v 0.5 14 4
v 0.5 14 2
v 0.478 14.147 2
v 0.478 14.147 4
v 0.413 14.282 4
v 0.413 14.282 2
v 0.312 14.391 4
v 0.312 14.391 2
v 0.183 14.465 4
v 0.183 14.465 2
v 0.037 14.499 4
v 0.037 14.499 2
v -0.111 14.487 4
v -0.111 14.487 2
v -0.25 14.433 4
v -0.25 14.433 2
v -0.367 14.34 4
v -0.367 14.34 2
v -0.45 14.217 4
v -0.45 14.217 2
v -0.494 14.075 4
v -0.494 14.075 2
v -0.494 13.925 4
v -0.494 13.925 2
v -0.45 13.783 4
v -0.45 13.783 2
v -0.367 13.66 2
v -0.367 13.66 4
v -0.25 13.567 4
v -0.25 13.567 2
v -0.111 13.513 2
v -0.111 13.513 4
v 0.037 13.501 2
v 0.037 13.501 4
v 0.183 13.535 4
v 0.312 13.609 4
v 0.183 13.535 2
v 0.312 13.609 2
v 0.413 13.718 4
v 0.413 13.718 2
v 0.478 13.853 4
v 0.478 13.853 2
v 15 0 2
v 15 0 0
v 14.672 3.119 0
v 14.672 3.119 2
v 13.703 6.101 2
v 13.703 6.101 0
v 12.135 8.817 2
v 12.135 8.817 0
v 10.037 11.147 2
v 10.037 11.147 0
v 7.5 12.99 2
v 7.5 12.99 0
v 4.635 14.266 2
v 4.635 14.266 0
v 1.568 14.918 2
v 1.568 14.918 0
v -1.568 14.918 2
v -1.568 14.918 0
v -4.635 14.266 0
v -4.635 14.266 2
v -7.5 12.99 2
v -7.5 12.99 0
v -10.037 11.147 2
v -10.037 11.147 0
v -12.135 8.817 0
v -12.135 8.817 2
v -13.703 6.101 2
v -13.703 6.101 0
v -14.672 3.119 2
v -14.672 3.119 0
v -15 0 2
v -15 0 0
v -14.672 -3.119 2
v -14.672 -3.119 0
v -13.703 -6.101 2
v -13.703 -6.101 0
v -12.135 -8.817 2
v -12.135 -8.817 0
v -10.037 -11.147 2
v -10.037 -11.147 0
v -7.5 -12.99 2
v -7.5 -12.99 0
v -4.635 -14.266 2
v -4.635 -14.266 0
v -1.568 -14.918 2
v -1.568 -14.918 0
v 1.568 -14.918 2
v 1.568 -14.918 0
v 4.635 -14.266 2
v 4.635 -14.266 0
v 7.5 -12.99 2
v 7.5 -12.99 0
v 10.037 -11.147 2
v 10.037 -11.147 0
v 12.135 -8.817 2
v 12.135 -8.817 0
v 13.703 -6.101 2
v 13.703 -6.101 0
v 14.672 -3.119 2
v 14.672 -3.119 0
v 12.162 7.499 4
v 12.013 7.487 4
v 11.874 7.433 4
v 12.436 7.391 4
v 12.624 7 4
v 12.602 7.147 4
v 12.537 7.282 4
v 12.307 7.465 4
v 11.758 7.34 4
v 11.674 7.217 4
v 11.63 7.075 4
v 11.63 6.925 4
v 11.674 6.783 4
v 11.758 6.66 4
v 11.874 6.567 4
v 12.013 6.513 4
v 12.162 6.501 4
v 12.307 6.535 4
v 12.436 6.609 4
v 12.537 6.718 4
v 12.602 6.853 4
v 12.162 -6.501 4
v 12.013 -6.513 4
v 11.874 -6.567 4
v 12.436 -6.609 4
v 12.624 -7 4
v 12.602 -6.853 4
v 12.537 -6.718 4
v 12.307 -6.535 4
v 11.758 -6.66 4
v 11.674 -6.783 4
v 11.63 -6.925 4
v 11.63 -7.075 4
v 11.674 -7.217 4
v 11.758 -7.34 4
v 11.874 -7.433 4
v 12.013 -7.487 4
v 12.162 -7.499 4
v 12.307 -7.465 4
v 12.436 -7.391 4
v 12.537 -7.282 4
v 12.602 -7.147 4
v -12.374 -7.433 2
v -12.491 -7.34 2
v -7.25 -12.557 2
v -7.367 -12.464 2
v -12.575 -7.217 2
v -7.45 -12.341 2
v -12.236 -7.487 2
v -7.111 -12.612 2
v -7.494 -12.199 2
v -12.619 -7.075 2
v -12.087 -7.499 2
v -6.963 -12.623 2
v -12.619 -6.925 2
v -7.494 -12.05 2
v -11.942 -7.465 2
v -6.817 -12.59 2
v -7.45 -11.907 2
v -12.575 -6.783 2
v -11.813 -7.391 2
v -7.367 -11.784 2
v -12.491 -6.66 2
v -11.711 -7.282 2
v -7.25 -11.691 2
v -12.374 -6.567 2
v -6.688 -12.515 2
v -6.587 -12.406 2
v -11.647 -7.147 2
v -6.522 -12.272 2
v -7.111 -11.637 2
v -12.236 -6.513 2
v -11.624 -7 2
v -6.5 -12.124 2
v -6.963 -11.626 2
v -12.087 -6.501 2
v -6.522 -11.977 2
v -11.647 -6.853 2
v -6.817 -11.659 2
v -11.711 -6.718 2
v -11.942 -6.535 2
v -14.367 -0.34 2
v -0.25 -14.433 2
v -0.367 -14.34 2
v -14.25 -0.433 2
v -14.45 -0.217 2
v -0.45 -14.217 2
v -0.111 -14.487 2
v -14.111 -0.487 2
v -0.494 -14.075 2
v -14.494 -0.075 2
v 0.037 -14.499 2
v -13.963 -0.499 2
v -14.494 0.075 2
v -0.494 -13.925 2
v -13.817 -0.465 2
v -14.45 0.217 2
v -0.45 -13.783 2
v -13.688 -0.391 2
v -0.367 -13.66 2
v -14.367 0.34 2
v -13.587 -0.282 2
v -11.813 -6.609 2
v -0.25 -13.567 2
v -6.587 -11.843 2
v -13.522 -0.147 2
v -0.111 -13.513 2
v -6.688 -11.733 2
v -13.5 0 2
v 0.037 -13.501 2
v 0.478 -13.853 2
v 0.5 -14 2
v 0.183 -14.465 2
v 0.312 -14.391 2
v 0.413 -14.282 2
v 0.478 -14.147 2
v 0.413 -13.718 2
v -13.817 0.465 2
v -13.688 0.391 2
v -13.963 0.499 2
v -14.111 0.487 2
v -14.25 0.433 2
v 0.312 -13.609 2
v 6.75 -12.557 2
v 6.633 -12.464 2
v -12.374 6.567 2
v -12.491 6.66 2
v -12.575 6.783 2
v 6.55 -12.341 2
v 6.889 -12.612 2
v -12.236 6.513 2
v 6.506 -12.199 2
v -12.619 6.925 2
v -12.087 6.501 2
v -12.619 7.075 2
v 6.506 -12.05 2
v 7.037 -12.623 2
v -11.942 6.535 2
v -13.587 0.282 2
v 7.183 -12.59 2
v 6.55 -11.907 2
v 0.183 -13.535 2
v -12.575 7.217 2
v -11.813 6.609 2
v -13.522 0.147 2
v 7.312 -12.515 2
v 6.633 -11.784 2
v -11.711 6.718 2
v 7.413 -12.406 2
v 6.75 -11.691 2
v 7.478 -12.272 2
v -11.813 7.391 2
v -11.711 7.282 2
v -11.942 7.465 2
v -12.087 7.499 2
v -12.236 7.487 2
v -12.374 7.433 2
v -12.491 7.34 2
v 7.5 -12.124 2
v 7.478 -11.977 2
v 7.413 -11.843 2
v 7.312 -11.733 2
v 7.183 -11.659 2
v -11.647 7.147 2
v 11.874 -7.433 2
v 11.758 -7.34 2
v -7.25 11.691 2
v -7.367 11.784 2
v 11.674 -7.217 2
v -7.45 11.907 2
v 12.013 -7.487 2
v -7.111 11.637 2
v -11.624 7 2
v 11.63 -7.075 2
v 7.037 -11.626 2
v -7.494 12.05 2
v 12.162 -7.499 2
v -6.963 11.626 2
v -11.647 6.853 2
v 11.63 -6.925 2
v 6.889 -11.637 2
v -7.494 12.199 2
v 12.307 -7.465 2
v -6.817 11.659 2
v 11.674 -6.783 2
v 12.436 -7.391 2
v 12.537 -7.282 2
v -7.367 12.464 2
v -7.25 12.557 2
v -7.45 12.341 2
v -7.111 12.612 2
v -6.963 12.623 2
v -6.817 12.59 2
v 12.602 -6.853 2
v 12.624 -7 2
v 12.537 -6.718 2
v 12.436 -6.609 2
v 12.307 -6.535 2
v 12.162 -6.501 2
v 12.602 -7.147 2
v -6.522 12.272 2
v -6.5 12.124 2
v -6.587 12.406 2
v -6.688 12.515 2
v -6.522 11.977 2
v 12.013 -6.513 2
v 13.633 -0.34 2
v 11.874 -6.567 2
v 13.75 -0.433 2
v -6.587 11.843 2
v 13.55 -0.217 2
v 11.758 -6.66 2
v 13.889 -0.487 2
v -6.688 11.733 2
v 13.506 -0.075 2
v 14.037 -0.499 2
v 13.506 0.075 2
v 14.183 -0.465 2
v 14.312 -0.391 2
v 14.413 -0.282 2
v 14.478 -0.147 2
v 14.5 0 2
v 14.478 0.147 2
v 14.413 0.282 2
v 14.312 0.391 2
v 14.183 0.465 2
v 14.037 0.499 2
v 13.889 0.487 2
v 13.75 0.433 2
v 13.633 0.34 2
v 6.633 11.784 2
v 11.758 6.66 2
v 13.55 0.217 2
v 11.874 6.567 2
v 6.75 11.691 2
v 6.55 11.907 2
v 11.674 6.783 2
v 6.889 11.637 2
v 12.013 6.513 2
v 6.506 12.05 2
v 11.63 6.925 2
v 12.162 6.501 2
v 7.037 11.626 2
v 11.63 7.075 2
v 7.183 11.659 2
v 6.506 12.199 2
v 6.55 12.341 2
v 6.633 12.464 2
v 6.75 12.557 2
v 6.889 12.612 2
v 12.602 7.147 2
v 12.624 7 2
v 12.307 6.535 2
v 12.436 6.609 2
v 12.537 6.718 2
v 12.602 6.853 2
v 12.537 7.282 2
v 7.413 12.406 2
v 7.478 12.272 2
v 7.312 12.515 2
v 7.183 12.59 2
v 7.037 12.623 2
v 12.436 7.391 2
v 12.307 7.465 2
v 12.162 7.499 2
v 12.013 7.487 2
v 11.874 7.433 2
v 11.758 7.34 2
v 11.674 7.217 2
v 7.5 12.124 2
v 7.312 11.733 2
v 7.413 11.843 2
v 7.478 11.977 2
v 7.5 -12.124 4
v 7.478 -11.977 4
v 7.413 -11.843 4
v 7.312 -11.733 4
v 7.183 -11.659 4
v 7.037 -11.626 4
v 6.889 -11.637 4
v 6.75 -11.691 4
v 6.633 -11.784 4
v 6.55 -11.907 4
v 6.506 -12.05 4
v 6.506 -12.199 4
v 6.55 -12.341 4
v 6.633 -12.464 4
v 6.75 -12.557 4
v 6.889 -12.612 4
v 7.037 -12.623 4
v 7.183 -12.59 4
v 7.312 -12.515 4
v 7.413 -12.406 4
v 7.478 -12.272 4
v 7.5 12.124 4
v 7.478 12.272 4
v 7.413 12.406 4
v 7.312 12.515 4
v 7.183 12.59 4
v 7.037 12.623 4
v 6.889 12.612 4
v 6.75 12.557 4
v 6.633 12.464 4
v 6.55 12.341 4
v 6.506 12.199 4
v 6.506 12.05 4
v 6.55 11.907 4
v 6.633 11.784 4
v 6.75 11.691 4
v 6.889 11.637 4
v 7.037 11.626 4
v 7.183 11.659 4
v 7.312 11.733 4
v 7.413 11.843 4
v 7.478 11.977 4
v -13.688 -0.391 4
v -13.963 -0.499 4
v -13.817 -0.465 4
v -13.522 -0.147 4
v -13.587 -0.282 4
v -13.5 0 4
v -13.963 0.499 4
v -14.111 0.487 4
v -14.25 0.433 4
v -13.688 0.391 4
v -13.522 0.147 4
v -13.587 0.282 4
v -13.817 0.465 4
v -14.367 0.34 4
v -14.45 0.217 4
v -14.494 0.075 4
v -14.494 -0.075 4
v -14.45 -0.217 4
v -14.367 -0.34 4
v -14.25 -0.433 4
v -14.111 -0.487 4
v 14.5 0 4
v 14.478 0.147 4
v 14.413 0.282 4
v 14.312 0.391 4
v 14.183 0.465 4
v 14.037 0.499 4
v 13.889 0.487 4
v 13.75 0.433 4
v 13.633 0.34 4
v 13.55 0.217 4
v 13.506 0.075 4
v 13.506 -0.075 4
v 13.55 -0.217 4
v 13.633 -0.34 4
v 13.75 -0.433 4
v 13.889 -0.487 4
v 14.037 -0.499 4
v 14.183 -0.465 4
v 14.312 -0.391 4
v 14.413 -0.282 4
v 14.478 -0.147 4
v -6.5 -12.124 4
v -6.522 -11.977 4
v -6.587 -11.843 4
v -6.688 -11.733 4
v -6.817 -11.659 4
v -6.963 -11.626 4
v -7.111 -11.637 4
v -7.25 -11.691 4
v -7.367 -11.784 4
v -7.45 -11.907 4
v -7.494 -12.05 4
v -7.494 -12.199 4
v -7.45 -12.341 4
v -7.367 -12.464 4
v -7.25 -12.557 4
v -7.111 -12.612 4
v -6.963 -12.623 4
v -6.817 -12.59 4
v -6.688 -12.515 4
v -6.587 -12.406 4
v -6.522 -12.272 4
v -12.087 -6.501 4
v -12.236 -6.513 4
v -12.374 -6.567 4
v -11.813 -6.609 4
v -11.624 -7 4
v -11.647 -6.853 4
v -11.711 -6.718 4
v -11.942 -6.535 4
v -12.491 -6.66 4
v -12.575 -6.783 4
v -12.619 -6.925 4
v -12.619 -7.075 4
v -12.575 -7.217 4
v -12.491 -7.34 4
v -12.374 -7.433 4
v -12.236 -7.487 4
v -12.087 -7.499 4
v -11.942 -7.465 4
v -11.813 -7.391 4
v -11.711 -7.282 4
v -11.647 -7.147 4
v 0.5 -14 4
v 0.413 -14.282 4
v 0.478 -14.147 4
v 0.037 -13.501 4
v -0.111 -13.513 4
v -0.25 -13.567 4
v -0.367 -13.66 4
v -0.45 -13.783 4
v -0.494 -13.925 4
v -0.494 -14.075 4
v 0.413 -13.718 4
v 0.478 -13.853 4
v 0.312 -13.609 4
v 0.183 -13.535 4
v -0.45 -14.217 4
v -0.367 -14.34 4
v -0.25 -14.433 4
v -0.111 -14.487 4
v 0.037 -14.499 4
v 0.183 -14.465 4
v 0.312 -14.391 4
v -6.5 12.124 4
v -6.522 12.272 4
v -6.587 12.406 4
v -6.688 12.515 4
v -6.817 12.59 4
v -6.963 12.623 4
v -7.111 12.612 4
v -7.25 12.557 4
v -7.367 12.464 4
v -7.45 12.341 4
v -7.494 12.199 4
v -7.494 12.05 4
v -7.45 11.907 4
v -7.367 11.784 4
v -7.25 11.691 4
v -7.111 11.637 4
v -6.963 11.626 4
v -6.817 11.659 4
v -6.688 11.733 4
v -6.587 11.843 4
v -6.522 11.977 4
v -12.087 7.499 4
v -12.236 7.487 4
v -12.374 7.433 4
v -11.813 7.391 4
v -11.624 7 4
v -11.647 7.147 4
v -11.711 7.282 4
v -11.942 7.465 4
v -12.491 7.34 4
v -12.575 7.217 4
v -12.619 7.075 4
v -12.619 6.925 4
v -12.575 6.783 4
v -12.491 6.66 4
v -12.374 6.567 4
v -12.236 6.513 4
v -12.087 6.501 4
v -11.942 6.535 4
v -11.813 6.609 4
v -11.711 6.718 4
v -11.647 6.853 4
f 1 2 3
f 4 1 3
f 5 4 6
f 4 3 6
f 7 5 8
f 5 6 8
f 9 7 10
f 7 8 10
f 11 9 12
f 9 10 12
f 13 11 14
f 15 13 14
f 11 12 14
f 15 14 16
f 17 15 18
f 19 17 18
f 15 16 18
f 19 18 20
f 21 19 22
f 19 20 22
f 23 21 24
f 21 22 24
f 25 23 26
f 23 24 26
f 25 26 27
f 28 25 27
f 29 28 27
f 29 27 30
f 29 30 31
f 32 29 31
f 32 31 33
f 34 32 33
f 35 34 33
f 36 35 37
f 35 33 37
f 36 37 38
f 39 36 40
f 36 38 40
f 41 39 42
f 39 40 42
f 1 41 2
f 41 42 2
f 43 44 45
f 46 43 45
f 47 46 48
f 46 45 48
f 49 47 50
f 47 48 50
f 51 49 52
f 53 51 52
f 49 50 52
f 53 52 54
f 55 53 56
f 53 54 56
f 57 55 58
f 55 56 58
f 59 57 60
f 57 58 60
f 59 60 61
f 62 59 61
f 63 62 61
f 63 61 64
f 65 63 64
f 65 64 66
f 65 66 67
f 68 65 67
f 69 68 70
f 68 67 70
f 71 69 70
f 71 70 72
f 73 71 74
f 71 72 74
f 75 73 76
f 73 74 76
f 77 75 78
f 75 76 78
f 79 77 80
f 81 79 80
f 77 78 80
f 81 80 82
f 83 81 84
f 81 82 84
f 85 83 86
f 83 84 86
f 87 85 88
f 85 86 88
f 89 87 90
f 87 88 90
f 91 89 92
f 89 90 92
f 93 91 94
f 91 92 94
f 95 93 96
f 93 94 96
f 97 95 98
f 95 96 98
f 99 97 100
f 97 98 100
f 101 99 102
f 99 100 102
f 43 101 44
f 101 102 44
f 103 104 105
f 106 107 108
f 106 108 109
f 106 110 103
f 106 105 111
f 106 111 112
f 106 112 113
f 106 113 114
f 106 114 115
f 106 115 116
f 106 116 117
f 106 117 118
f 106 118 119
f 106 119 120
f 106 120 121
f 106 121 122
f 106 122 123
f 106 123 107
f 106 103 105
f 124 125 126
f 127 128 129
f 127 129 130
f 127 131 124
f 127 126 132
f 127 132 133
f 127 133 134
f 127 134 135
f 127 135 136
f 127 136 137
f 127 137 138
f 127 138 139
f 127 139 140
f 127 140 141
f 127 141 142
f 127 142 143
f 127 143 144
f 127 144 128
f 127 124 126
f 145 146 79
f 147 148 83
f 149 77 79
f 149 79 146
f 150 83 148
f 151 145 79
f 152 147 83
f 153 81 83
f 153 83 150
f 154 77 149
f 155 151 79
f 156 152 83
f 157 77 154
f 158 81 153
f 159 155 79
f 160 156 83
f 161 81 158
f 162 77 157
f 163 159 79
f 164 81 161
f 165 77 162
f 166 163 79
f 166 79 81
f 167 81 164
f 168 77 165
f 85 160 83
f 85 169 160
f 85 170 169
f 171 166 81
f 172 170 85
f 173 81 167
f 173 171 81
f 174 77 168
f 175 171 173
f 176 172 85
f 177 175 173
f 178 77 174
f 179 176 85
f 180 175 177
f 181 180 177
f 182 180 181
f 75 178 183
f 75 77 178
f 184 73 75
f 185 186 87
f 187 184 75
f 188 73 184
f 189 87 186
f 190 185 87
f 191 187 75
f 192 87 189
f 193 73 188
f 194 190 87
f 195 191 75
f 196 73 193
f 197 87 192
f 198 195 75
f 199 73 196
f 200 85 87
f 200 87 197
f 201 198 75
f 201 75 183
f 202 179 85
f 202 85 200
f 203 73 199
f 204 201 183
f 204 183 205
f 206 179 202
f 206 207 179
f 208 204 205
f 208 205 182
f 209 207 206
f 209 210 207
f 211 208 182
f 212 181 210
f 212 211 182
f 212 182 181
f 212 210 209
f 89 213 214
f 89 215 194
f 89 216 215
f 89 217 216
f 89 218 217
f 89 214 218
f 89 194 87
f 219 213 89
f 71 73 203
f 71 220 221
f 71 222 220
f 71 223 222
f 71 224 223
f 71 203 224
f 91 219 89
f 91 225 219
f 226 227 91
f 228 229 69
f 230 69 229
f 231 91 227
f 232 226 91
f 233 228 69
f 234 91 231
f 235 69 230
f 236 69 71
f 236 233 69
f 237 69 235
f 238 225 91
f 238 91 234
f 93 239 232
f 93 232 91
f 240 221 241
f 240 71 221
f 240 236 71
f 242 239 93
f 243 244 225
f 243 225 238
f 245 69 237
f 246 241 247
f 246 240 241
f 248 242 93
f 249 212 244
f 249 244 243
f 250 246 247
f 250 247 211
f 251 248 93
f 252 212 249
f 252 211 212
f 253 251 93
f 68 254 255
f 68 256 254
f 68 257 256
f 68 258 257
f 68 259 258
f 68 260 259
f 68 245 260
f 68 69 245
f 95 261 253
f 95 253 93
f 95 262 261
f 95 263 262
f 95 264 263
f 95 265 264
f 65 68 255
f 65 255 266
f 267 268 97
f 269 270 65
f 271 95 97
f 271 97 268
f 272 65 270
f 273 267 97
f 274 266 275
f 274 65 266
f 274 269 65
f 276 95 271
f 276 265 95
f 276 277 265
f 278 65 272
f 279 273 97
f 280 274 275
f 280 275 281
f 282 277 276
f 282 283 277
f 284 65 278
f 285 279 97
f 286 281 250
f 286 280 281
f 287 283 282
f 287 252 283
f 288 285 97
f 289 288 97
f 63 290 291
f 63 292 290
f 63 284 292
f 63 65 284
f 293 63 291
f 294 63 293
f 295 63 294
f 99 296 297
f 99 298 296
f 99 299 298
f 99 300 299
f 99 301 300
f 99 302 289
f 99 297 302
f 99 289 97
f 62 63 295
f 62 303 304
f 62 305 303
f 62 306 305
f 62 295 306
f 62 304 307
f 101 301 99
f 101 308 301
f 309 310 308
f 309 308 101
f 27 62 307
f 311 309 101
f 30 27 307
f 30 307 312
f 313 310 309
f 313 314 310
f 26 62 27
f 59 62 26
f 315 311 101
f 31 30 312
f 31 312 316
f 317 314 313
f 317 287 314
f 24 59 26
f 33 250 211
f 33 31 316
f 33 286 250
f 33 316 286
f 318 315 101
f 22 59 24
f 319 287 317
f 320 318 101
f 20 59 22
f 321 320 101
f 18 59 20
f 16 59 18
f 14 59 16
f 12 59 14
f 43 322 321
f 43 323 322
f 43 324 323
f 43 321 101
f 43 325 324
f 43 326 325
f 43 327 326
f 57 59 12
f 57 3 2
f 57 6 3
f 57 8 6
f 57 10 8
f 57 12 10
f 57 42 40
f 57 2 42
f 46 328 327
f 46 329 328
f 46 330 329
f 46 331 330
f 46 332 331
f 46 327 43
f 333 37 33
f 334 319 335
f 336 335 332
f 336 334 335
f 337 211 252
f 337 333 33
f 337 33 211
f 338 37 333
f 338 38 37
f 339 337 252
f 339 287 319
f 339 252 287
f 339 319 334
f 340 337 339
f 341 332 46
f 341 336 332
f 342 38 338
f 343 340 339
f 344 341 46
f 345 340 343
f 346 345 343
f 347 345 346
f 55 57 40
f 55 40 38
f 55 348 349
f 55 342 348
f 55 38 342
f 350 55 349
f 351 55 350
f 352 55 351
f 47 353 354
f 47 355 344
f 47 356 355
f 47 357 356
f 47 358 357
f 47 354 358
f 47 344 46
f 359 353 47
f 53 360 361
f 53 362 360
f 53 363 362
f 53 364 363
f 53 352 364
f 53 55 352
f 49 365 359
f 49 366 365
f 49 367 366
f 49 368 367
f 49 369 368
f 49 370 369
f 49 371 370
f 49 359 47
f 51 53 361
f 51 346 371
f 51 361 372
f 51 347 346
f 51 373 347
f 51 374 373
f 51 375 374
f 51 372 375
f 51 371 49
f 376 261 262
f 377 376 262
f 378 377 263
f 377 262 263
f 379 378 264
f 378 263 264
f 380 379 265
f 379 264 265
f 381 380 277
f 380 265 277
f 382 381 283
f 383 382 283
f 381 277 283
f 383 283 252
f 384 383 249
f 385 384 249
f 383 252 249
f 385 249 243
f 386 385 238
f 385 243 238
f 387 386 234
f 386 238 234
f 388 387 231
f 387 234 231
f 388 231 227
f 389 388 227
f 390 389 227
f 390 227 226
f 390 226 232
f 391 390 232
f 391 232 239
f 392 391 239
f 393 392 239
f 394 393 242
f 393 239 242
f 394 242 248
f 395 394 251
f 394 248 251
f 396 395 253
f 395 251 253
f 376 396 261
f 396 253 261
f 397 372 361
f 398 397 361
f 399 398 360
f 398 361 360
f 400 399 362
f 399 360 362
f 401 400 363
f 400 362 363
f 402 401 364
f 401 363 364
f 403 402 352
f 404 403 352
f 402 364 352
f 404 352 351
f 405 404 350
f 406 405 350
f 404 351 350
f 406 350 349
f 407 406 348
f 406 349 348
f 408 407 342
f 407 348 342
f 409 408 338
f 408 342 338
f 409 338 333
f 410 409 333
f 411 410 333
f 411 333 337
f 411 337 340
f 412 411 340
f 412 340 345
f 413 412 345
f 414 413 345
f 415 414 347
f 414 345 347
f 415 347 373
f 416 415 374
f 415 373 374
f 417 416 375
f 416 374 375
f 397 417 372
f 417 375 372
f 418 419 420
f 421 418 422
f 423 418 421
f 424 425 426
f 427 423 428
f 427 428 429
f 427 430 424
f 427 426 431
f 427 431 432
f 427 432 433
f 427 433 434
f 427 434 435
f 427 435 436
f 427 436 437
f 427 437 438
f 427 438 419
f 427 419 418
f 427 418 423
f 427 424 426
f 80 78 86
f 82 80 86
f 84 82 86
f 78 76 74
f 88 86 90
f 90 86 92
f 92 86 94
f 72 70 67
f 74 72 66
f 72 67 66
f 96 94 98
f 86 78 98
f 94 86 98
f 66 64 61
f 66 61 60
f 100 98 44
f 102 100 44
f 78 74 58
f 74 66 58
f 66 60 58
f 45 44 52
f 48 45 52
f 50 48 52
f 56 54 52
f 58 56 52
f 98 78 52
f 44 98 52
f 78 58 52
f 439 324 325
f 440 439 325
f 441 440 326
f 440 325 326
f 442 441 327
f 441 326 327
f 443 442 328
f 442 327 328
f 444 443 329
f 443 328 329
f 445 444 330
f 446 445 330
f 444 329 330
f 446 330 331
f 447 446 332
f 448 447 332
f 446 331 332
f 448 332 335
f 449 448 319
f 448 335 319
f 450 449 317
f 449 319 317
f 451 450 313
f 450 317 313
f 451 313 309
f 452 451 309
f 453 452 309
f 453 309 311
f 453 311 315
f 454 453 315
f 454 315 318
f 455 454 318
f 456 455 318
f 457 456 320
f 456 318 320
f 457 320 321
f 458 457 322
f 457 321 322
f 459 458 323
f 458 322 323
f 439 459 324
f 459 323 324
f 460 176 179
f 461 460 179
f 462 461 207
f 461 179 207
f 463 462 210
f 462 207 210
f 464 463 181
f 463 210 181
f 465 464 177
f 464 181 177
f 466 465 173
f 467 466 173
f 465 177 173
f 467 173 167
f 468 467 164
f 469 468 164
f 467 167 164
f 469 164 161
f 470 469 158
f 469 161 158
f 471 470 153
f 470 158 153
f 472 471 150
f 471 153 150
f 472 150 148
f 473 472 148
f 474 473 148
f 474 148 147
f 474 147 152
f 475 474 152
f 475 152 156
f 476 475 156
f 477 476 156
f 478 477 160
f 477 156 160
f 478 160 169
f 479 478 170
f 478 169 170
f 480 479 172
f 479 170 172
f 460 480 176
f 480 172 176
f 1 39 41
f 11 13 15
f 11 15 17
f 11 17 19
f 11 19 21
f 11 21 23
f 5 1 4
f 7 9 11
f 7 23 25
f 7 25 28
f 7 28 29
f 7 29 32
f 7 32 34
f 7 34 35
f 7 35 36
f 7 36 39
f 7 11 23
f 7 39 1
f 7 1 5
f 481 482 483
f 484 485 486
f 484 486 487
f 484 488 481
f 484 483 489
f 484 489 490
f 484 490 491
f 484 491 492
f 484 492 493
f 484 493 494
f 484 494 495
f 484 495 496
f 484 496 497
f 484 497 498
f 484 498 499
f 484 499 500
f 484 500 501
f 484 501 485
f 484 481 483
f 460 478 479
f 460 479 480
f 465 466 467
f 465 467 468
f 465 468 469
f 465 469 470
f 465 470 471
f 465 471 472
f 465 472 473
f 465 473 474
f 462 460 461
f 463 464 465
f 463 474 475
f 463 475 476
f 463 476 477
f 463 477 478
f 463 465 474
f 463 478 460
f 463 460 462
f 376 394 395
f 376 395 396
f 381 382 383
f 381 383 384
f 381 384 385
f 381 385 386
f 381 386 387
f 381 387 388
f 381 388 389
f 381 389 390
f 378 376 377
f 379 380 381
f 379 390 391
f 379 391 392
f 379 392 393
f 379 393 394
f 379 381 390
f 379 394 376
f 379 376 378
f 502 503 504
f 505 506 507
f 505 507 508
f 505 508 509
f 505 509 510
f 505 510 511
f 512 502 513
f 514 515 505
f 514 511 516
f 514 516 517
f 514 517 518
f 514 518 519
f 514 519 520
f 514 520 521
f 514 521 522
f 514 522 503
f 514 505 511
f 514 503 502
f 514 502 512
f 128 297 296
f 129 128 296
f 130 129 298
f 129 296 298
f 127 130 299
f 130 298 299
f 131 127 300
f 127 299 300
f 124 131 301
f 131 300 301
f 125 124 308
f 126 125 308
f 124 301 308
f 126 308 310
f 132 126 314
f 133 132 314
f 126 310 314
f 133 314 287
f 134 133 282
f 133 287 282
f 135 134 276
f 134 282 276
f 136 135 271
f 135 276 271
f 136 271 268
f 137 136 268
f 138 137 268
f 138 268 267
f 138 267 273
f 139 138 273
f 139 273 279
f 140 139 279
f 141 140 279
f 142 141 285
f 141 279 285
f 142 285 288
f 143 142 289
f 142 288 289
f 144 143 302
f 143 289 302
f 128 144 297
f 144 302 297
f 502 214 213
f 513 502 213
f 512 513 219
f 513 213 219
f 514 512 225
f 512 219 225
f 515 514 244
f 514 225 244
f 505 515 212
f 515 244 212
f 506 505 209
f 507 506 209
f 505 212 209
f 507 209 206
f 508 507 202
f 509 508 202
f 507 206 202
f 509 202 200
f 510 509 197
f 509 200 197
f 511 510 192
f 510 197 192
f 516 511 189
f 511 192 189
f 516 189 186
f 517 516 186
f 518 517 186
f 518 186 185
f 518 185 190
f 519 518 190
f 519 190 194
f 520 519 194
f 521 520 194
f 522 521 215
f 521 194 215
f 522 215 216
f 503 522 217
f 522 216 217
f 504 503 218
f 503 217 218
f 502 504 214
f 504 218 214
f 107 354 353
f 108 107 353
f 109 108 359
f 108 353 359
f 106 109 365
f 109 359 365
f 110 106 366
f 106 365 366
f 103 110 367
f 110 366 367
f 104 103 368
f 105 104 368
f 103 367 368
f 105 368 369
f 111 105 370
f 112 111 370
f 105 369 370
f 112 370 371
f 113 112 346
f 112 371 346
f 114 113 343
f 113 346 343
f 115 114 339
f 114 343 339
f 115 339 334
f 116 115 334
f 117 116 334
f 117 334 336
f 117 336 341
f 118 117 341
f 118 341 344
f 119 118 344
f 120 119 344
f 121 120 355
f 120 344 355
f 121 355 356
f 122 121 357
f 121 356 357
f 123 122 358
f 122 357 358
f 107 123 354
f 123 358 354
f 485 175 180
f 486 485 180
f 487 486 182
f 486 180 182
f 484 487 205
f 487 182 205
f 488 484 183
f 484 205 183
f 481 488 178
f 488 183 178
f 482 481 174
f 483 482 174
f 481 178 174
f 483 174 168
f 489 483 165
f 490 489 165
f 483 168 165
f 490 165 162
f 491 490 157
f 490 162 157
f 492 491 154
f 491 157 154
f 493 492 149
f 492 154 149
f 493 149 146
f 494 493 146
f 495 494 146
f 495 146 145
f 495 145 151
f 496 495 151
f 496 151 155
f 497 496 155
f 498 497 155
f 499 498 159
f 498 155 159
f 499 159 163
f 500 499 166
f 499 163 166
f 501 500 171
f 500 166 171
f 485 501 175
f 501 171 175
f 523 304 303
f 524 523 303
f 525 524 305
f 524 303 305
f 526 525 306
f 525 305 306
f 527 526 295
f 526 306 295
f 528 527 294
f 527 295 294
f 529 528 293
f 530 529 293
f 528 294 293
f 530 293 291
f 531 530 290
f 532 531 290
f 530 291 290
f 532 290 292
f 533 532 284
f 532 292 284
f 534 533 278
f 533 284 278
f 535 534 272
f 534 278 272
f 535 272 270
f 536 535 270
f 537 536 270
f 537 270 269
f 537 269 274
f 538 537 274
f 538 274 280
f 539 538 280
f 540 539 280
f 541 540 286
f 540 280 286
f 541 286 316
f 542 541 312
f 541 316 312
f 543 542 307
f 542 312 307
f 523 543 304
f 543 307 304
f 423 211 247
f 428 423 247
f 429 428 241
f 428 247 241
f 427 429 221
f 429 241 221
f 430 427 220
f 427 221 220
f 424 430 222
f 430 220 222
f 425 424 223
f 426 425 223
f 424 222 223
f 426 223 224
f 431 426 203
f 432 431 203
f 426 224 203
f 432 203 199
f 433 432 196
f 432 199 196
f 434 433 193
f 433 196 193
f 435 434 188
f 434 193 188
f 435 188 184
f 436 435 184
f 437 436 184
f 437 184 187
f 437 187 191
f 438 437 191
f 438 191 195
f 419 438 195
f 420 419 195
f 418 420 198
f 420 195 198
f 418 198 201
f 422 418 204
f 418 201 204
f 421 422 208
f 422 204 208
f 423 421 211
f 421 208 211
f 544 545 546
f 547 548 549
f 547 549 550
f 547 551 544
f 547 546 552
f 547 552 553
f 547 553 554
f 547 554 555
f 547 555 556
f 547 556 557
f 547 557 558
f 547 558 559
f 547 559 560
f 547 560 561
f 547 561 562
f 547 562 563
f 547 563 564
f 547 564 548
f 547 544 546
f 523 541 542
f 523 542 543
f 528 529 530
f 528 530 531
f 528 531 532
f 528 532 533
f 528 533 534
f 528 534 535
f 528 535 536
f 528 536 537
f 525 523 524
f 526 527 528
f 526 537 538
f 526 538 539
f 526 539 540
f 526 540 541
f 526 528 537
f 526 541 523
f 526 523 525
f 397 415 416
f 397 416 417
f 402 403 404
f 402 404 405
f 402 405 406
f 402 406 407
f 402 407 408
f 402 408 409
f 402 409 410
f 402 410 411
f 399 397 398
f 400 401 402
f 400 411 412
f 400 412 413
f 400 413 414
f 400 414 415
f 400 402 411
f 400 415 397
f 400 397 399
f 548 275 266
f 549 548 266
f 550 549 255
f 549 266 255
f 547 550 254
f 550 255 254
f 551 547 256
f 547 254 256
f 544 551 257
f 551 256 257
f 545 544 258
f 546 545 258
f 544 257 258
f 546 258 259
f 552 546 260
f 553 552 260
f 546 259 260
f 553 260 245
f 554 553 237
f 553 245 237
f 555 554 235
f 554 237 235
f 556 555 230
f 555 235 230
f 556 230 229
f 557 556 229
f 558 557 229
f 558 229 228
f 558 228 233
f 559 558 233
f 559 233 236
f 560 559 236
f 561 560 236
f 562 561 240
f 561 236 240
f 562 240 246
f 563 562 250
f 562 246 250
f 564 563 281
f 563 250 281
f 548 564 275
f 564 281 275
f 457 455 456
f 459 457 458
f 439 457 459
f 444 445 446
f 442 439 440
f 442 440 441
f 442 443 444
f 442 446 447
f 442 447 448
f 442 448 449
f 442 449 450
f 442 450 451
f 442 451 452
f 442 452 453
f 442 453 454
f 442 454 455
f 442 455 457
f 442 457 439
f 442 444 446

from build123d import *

# Parameters (mm, degrees)
F0_R     = 15
F1_DEPTH = 2
F2_R     = 0.5
F3_DEPTH = 2


with BuildPart() as f1:
    # F0 (on Top) → F1 (new body)
    with BuildSketch(Plane.XY):
        Circle(F0_R)
    extrude(amount=F1_DEPTH)

    # F2 (on face) → F3 (join)
    with BuildSketch(Plane.XY.offset(2)):
        with Locations((0, 14)):
            Circle(F2_R)
        with Locations((7, 12.124356)):
            Circle(F2_R)
        with Locations((12.124356, 7)):
            Circle(F2_R)
        with Locations((14, 0)):
            Circle(F2_R)
        with Locations((12.124356, -7)):
            Circle(F2_R)
        with Locations((7, -12.124356)):
            Circle(F2_R)
        with Locations((0, -14)):
            Circle(F2_R)
        with Locations((-7, -12.124356)):
            Circle(F2_R)
        with Locations((-12.124356, -7)):
            Circle(F2_R)
        with Locations((-14, 0)):
            Circle(F2_R)
        with Locations((-12.124356, 7)):
            Circle(F2_R)
        with Locations((-7, 12.124356)):
            Circle(F2_R)
    extrude(amount=F3_DEPTH)


solid = f1.part
